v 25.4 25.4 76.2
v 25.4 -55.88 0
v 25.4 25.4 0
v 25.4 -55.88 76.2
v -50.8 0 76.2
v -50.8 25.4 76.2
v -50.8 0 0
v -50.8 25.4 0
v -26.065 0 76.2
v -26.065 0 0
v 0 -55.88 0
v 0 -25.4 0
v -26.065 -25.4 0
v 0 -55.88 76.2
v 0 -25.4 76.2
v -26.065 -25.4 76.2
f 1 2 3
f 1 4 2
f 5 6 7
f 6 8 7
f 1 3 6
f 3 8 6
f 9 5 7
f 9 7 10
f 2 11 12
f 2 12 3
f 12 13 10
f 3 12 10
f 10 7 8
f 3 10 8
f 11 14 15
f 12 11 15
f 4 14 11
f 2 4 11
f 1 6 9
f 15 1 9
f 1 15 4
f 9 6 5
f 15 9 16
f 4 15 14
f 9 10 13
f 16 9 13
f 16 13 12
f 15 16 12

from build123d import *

# Parameters (mm, degrees)
F0_W     = 50.8
F0_H     = 25.4
F1_DEPTH = 25.4
F2_W     = 26.06531
F2_H     = 25.4
F3_DEPTH = 25.4
F5_DEPTH = 50.8
F7_DEPTH = 25.4


with BuildPart() as f1:
    # F0 (on Top) → F1 (new body)
    with BuildSketch(Plane.XY):
        with Locations((-25.4, 12.7)):
            Rectangle(F0_W, F0_H)
    extrude(amount=F1_DEPTH)

    # F2 (on Top) → F3 (join)
    with BuildSketch(Plane.XY):
        with Locations((-13.032655, -12.7)):
            Rectangle(F2_W, F2_H)
    extrude(amount=F3_DEPTH)

    # F4 (on face) → F5 (join)
    with BuildSketch(Plane.XY.offset(25.4)):
        Polygon((0, -25.4), (0, 25.4), (-50.8, 25.4), (-50.8, 0), (-26.06531, 0), (-26.06531, -25.4), align=None)
    extrude(amount=F5_DEPTH)

    # F6 (on face) → F7 (join)
    with BuildSketch(Plane.YZ):
        Polygon((-55.88, 0), (-25.4, 0), (25.4, 0), (25.4, 76.2), (-23.200989, 76.2), (-55.88, 76.2), align=None)
    extrude(amount=F7_DEPTH)


solid = f1.part
